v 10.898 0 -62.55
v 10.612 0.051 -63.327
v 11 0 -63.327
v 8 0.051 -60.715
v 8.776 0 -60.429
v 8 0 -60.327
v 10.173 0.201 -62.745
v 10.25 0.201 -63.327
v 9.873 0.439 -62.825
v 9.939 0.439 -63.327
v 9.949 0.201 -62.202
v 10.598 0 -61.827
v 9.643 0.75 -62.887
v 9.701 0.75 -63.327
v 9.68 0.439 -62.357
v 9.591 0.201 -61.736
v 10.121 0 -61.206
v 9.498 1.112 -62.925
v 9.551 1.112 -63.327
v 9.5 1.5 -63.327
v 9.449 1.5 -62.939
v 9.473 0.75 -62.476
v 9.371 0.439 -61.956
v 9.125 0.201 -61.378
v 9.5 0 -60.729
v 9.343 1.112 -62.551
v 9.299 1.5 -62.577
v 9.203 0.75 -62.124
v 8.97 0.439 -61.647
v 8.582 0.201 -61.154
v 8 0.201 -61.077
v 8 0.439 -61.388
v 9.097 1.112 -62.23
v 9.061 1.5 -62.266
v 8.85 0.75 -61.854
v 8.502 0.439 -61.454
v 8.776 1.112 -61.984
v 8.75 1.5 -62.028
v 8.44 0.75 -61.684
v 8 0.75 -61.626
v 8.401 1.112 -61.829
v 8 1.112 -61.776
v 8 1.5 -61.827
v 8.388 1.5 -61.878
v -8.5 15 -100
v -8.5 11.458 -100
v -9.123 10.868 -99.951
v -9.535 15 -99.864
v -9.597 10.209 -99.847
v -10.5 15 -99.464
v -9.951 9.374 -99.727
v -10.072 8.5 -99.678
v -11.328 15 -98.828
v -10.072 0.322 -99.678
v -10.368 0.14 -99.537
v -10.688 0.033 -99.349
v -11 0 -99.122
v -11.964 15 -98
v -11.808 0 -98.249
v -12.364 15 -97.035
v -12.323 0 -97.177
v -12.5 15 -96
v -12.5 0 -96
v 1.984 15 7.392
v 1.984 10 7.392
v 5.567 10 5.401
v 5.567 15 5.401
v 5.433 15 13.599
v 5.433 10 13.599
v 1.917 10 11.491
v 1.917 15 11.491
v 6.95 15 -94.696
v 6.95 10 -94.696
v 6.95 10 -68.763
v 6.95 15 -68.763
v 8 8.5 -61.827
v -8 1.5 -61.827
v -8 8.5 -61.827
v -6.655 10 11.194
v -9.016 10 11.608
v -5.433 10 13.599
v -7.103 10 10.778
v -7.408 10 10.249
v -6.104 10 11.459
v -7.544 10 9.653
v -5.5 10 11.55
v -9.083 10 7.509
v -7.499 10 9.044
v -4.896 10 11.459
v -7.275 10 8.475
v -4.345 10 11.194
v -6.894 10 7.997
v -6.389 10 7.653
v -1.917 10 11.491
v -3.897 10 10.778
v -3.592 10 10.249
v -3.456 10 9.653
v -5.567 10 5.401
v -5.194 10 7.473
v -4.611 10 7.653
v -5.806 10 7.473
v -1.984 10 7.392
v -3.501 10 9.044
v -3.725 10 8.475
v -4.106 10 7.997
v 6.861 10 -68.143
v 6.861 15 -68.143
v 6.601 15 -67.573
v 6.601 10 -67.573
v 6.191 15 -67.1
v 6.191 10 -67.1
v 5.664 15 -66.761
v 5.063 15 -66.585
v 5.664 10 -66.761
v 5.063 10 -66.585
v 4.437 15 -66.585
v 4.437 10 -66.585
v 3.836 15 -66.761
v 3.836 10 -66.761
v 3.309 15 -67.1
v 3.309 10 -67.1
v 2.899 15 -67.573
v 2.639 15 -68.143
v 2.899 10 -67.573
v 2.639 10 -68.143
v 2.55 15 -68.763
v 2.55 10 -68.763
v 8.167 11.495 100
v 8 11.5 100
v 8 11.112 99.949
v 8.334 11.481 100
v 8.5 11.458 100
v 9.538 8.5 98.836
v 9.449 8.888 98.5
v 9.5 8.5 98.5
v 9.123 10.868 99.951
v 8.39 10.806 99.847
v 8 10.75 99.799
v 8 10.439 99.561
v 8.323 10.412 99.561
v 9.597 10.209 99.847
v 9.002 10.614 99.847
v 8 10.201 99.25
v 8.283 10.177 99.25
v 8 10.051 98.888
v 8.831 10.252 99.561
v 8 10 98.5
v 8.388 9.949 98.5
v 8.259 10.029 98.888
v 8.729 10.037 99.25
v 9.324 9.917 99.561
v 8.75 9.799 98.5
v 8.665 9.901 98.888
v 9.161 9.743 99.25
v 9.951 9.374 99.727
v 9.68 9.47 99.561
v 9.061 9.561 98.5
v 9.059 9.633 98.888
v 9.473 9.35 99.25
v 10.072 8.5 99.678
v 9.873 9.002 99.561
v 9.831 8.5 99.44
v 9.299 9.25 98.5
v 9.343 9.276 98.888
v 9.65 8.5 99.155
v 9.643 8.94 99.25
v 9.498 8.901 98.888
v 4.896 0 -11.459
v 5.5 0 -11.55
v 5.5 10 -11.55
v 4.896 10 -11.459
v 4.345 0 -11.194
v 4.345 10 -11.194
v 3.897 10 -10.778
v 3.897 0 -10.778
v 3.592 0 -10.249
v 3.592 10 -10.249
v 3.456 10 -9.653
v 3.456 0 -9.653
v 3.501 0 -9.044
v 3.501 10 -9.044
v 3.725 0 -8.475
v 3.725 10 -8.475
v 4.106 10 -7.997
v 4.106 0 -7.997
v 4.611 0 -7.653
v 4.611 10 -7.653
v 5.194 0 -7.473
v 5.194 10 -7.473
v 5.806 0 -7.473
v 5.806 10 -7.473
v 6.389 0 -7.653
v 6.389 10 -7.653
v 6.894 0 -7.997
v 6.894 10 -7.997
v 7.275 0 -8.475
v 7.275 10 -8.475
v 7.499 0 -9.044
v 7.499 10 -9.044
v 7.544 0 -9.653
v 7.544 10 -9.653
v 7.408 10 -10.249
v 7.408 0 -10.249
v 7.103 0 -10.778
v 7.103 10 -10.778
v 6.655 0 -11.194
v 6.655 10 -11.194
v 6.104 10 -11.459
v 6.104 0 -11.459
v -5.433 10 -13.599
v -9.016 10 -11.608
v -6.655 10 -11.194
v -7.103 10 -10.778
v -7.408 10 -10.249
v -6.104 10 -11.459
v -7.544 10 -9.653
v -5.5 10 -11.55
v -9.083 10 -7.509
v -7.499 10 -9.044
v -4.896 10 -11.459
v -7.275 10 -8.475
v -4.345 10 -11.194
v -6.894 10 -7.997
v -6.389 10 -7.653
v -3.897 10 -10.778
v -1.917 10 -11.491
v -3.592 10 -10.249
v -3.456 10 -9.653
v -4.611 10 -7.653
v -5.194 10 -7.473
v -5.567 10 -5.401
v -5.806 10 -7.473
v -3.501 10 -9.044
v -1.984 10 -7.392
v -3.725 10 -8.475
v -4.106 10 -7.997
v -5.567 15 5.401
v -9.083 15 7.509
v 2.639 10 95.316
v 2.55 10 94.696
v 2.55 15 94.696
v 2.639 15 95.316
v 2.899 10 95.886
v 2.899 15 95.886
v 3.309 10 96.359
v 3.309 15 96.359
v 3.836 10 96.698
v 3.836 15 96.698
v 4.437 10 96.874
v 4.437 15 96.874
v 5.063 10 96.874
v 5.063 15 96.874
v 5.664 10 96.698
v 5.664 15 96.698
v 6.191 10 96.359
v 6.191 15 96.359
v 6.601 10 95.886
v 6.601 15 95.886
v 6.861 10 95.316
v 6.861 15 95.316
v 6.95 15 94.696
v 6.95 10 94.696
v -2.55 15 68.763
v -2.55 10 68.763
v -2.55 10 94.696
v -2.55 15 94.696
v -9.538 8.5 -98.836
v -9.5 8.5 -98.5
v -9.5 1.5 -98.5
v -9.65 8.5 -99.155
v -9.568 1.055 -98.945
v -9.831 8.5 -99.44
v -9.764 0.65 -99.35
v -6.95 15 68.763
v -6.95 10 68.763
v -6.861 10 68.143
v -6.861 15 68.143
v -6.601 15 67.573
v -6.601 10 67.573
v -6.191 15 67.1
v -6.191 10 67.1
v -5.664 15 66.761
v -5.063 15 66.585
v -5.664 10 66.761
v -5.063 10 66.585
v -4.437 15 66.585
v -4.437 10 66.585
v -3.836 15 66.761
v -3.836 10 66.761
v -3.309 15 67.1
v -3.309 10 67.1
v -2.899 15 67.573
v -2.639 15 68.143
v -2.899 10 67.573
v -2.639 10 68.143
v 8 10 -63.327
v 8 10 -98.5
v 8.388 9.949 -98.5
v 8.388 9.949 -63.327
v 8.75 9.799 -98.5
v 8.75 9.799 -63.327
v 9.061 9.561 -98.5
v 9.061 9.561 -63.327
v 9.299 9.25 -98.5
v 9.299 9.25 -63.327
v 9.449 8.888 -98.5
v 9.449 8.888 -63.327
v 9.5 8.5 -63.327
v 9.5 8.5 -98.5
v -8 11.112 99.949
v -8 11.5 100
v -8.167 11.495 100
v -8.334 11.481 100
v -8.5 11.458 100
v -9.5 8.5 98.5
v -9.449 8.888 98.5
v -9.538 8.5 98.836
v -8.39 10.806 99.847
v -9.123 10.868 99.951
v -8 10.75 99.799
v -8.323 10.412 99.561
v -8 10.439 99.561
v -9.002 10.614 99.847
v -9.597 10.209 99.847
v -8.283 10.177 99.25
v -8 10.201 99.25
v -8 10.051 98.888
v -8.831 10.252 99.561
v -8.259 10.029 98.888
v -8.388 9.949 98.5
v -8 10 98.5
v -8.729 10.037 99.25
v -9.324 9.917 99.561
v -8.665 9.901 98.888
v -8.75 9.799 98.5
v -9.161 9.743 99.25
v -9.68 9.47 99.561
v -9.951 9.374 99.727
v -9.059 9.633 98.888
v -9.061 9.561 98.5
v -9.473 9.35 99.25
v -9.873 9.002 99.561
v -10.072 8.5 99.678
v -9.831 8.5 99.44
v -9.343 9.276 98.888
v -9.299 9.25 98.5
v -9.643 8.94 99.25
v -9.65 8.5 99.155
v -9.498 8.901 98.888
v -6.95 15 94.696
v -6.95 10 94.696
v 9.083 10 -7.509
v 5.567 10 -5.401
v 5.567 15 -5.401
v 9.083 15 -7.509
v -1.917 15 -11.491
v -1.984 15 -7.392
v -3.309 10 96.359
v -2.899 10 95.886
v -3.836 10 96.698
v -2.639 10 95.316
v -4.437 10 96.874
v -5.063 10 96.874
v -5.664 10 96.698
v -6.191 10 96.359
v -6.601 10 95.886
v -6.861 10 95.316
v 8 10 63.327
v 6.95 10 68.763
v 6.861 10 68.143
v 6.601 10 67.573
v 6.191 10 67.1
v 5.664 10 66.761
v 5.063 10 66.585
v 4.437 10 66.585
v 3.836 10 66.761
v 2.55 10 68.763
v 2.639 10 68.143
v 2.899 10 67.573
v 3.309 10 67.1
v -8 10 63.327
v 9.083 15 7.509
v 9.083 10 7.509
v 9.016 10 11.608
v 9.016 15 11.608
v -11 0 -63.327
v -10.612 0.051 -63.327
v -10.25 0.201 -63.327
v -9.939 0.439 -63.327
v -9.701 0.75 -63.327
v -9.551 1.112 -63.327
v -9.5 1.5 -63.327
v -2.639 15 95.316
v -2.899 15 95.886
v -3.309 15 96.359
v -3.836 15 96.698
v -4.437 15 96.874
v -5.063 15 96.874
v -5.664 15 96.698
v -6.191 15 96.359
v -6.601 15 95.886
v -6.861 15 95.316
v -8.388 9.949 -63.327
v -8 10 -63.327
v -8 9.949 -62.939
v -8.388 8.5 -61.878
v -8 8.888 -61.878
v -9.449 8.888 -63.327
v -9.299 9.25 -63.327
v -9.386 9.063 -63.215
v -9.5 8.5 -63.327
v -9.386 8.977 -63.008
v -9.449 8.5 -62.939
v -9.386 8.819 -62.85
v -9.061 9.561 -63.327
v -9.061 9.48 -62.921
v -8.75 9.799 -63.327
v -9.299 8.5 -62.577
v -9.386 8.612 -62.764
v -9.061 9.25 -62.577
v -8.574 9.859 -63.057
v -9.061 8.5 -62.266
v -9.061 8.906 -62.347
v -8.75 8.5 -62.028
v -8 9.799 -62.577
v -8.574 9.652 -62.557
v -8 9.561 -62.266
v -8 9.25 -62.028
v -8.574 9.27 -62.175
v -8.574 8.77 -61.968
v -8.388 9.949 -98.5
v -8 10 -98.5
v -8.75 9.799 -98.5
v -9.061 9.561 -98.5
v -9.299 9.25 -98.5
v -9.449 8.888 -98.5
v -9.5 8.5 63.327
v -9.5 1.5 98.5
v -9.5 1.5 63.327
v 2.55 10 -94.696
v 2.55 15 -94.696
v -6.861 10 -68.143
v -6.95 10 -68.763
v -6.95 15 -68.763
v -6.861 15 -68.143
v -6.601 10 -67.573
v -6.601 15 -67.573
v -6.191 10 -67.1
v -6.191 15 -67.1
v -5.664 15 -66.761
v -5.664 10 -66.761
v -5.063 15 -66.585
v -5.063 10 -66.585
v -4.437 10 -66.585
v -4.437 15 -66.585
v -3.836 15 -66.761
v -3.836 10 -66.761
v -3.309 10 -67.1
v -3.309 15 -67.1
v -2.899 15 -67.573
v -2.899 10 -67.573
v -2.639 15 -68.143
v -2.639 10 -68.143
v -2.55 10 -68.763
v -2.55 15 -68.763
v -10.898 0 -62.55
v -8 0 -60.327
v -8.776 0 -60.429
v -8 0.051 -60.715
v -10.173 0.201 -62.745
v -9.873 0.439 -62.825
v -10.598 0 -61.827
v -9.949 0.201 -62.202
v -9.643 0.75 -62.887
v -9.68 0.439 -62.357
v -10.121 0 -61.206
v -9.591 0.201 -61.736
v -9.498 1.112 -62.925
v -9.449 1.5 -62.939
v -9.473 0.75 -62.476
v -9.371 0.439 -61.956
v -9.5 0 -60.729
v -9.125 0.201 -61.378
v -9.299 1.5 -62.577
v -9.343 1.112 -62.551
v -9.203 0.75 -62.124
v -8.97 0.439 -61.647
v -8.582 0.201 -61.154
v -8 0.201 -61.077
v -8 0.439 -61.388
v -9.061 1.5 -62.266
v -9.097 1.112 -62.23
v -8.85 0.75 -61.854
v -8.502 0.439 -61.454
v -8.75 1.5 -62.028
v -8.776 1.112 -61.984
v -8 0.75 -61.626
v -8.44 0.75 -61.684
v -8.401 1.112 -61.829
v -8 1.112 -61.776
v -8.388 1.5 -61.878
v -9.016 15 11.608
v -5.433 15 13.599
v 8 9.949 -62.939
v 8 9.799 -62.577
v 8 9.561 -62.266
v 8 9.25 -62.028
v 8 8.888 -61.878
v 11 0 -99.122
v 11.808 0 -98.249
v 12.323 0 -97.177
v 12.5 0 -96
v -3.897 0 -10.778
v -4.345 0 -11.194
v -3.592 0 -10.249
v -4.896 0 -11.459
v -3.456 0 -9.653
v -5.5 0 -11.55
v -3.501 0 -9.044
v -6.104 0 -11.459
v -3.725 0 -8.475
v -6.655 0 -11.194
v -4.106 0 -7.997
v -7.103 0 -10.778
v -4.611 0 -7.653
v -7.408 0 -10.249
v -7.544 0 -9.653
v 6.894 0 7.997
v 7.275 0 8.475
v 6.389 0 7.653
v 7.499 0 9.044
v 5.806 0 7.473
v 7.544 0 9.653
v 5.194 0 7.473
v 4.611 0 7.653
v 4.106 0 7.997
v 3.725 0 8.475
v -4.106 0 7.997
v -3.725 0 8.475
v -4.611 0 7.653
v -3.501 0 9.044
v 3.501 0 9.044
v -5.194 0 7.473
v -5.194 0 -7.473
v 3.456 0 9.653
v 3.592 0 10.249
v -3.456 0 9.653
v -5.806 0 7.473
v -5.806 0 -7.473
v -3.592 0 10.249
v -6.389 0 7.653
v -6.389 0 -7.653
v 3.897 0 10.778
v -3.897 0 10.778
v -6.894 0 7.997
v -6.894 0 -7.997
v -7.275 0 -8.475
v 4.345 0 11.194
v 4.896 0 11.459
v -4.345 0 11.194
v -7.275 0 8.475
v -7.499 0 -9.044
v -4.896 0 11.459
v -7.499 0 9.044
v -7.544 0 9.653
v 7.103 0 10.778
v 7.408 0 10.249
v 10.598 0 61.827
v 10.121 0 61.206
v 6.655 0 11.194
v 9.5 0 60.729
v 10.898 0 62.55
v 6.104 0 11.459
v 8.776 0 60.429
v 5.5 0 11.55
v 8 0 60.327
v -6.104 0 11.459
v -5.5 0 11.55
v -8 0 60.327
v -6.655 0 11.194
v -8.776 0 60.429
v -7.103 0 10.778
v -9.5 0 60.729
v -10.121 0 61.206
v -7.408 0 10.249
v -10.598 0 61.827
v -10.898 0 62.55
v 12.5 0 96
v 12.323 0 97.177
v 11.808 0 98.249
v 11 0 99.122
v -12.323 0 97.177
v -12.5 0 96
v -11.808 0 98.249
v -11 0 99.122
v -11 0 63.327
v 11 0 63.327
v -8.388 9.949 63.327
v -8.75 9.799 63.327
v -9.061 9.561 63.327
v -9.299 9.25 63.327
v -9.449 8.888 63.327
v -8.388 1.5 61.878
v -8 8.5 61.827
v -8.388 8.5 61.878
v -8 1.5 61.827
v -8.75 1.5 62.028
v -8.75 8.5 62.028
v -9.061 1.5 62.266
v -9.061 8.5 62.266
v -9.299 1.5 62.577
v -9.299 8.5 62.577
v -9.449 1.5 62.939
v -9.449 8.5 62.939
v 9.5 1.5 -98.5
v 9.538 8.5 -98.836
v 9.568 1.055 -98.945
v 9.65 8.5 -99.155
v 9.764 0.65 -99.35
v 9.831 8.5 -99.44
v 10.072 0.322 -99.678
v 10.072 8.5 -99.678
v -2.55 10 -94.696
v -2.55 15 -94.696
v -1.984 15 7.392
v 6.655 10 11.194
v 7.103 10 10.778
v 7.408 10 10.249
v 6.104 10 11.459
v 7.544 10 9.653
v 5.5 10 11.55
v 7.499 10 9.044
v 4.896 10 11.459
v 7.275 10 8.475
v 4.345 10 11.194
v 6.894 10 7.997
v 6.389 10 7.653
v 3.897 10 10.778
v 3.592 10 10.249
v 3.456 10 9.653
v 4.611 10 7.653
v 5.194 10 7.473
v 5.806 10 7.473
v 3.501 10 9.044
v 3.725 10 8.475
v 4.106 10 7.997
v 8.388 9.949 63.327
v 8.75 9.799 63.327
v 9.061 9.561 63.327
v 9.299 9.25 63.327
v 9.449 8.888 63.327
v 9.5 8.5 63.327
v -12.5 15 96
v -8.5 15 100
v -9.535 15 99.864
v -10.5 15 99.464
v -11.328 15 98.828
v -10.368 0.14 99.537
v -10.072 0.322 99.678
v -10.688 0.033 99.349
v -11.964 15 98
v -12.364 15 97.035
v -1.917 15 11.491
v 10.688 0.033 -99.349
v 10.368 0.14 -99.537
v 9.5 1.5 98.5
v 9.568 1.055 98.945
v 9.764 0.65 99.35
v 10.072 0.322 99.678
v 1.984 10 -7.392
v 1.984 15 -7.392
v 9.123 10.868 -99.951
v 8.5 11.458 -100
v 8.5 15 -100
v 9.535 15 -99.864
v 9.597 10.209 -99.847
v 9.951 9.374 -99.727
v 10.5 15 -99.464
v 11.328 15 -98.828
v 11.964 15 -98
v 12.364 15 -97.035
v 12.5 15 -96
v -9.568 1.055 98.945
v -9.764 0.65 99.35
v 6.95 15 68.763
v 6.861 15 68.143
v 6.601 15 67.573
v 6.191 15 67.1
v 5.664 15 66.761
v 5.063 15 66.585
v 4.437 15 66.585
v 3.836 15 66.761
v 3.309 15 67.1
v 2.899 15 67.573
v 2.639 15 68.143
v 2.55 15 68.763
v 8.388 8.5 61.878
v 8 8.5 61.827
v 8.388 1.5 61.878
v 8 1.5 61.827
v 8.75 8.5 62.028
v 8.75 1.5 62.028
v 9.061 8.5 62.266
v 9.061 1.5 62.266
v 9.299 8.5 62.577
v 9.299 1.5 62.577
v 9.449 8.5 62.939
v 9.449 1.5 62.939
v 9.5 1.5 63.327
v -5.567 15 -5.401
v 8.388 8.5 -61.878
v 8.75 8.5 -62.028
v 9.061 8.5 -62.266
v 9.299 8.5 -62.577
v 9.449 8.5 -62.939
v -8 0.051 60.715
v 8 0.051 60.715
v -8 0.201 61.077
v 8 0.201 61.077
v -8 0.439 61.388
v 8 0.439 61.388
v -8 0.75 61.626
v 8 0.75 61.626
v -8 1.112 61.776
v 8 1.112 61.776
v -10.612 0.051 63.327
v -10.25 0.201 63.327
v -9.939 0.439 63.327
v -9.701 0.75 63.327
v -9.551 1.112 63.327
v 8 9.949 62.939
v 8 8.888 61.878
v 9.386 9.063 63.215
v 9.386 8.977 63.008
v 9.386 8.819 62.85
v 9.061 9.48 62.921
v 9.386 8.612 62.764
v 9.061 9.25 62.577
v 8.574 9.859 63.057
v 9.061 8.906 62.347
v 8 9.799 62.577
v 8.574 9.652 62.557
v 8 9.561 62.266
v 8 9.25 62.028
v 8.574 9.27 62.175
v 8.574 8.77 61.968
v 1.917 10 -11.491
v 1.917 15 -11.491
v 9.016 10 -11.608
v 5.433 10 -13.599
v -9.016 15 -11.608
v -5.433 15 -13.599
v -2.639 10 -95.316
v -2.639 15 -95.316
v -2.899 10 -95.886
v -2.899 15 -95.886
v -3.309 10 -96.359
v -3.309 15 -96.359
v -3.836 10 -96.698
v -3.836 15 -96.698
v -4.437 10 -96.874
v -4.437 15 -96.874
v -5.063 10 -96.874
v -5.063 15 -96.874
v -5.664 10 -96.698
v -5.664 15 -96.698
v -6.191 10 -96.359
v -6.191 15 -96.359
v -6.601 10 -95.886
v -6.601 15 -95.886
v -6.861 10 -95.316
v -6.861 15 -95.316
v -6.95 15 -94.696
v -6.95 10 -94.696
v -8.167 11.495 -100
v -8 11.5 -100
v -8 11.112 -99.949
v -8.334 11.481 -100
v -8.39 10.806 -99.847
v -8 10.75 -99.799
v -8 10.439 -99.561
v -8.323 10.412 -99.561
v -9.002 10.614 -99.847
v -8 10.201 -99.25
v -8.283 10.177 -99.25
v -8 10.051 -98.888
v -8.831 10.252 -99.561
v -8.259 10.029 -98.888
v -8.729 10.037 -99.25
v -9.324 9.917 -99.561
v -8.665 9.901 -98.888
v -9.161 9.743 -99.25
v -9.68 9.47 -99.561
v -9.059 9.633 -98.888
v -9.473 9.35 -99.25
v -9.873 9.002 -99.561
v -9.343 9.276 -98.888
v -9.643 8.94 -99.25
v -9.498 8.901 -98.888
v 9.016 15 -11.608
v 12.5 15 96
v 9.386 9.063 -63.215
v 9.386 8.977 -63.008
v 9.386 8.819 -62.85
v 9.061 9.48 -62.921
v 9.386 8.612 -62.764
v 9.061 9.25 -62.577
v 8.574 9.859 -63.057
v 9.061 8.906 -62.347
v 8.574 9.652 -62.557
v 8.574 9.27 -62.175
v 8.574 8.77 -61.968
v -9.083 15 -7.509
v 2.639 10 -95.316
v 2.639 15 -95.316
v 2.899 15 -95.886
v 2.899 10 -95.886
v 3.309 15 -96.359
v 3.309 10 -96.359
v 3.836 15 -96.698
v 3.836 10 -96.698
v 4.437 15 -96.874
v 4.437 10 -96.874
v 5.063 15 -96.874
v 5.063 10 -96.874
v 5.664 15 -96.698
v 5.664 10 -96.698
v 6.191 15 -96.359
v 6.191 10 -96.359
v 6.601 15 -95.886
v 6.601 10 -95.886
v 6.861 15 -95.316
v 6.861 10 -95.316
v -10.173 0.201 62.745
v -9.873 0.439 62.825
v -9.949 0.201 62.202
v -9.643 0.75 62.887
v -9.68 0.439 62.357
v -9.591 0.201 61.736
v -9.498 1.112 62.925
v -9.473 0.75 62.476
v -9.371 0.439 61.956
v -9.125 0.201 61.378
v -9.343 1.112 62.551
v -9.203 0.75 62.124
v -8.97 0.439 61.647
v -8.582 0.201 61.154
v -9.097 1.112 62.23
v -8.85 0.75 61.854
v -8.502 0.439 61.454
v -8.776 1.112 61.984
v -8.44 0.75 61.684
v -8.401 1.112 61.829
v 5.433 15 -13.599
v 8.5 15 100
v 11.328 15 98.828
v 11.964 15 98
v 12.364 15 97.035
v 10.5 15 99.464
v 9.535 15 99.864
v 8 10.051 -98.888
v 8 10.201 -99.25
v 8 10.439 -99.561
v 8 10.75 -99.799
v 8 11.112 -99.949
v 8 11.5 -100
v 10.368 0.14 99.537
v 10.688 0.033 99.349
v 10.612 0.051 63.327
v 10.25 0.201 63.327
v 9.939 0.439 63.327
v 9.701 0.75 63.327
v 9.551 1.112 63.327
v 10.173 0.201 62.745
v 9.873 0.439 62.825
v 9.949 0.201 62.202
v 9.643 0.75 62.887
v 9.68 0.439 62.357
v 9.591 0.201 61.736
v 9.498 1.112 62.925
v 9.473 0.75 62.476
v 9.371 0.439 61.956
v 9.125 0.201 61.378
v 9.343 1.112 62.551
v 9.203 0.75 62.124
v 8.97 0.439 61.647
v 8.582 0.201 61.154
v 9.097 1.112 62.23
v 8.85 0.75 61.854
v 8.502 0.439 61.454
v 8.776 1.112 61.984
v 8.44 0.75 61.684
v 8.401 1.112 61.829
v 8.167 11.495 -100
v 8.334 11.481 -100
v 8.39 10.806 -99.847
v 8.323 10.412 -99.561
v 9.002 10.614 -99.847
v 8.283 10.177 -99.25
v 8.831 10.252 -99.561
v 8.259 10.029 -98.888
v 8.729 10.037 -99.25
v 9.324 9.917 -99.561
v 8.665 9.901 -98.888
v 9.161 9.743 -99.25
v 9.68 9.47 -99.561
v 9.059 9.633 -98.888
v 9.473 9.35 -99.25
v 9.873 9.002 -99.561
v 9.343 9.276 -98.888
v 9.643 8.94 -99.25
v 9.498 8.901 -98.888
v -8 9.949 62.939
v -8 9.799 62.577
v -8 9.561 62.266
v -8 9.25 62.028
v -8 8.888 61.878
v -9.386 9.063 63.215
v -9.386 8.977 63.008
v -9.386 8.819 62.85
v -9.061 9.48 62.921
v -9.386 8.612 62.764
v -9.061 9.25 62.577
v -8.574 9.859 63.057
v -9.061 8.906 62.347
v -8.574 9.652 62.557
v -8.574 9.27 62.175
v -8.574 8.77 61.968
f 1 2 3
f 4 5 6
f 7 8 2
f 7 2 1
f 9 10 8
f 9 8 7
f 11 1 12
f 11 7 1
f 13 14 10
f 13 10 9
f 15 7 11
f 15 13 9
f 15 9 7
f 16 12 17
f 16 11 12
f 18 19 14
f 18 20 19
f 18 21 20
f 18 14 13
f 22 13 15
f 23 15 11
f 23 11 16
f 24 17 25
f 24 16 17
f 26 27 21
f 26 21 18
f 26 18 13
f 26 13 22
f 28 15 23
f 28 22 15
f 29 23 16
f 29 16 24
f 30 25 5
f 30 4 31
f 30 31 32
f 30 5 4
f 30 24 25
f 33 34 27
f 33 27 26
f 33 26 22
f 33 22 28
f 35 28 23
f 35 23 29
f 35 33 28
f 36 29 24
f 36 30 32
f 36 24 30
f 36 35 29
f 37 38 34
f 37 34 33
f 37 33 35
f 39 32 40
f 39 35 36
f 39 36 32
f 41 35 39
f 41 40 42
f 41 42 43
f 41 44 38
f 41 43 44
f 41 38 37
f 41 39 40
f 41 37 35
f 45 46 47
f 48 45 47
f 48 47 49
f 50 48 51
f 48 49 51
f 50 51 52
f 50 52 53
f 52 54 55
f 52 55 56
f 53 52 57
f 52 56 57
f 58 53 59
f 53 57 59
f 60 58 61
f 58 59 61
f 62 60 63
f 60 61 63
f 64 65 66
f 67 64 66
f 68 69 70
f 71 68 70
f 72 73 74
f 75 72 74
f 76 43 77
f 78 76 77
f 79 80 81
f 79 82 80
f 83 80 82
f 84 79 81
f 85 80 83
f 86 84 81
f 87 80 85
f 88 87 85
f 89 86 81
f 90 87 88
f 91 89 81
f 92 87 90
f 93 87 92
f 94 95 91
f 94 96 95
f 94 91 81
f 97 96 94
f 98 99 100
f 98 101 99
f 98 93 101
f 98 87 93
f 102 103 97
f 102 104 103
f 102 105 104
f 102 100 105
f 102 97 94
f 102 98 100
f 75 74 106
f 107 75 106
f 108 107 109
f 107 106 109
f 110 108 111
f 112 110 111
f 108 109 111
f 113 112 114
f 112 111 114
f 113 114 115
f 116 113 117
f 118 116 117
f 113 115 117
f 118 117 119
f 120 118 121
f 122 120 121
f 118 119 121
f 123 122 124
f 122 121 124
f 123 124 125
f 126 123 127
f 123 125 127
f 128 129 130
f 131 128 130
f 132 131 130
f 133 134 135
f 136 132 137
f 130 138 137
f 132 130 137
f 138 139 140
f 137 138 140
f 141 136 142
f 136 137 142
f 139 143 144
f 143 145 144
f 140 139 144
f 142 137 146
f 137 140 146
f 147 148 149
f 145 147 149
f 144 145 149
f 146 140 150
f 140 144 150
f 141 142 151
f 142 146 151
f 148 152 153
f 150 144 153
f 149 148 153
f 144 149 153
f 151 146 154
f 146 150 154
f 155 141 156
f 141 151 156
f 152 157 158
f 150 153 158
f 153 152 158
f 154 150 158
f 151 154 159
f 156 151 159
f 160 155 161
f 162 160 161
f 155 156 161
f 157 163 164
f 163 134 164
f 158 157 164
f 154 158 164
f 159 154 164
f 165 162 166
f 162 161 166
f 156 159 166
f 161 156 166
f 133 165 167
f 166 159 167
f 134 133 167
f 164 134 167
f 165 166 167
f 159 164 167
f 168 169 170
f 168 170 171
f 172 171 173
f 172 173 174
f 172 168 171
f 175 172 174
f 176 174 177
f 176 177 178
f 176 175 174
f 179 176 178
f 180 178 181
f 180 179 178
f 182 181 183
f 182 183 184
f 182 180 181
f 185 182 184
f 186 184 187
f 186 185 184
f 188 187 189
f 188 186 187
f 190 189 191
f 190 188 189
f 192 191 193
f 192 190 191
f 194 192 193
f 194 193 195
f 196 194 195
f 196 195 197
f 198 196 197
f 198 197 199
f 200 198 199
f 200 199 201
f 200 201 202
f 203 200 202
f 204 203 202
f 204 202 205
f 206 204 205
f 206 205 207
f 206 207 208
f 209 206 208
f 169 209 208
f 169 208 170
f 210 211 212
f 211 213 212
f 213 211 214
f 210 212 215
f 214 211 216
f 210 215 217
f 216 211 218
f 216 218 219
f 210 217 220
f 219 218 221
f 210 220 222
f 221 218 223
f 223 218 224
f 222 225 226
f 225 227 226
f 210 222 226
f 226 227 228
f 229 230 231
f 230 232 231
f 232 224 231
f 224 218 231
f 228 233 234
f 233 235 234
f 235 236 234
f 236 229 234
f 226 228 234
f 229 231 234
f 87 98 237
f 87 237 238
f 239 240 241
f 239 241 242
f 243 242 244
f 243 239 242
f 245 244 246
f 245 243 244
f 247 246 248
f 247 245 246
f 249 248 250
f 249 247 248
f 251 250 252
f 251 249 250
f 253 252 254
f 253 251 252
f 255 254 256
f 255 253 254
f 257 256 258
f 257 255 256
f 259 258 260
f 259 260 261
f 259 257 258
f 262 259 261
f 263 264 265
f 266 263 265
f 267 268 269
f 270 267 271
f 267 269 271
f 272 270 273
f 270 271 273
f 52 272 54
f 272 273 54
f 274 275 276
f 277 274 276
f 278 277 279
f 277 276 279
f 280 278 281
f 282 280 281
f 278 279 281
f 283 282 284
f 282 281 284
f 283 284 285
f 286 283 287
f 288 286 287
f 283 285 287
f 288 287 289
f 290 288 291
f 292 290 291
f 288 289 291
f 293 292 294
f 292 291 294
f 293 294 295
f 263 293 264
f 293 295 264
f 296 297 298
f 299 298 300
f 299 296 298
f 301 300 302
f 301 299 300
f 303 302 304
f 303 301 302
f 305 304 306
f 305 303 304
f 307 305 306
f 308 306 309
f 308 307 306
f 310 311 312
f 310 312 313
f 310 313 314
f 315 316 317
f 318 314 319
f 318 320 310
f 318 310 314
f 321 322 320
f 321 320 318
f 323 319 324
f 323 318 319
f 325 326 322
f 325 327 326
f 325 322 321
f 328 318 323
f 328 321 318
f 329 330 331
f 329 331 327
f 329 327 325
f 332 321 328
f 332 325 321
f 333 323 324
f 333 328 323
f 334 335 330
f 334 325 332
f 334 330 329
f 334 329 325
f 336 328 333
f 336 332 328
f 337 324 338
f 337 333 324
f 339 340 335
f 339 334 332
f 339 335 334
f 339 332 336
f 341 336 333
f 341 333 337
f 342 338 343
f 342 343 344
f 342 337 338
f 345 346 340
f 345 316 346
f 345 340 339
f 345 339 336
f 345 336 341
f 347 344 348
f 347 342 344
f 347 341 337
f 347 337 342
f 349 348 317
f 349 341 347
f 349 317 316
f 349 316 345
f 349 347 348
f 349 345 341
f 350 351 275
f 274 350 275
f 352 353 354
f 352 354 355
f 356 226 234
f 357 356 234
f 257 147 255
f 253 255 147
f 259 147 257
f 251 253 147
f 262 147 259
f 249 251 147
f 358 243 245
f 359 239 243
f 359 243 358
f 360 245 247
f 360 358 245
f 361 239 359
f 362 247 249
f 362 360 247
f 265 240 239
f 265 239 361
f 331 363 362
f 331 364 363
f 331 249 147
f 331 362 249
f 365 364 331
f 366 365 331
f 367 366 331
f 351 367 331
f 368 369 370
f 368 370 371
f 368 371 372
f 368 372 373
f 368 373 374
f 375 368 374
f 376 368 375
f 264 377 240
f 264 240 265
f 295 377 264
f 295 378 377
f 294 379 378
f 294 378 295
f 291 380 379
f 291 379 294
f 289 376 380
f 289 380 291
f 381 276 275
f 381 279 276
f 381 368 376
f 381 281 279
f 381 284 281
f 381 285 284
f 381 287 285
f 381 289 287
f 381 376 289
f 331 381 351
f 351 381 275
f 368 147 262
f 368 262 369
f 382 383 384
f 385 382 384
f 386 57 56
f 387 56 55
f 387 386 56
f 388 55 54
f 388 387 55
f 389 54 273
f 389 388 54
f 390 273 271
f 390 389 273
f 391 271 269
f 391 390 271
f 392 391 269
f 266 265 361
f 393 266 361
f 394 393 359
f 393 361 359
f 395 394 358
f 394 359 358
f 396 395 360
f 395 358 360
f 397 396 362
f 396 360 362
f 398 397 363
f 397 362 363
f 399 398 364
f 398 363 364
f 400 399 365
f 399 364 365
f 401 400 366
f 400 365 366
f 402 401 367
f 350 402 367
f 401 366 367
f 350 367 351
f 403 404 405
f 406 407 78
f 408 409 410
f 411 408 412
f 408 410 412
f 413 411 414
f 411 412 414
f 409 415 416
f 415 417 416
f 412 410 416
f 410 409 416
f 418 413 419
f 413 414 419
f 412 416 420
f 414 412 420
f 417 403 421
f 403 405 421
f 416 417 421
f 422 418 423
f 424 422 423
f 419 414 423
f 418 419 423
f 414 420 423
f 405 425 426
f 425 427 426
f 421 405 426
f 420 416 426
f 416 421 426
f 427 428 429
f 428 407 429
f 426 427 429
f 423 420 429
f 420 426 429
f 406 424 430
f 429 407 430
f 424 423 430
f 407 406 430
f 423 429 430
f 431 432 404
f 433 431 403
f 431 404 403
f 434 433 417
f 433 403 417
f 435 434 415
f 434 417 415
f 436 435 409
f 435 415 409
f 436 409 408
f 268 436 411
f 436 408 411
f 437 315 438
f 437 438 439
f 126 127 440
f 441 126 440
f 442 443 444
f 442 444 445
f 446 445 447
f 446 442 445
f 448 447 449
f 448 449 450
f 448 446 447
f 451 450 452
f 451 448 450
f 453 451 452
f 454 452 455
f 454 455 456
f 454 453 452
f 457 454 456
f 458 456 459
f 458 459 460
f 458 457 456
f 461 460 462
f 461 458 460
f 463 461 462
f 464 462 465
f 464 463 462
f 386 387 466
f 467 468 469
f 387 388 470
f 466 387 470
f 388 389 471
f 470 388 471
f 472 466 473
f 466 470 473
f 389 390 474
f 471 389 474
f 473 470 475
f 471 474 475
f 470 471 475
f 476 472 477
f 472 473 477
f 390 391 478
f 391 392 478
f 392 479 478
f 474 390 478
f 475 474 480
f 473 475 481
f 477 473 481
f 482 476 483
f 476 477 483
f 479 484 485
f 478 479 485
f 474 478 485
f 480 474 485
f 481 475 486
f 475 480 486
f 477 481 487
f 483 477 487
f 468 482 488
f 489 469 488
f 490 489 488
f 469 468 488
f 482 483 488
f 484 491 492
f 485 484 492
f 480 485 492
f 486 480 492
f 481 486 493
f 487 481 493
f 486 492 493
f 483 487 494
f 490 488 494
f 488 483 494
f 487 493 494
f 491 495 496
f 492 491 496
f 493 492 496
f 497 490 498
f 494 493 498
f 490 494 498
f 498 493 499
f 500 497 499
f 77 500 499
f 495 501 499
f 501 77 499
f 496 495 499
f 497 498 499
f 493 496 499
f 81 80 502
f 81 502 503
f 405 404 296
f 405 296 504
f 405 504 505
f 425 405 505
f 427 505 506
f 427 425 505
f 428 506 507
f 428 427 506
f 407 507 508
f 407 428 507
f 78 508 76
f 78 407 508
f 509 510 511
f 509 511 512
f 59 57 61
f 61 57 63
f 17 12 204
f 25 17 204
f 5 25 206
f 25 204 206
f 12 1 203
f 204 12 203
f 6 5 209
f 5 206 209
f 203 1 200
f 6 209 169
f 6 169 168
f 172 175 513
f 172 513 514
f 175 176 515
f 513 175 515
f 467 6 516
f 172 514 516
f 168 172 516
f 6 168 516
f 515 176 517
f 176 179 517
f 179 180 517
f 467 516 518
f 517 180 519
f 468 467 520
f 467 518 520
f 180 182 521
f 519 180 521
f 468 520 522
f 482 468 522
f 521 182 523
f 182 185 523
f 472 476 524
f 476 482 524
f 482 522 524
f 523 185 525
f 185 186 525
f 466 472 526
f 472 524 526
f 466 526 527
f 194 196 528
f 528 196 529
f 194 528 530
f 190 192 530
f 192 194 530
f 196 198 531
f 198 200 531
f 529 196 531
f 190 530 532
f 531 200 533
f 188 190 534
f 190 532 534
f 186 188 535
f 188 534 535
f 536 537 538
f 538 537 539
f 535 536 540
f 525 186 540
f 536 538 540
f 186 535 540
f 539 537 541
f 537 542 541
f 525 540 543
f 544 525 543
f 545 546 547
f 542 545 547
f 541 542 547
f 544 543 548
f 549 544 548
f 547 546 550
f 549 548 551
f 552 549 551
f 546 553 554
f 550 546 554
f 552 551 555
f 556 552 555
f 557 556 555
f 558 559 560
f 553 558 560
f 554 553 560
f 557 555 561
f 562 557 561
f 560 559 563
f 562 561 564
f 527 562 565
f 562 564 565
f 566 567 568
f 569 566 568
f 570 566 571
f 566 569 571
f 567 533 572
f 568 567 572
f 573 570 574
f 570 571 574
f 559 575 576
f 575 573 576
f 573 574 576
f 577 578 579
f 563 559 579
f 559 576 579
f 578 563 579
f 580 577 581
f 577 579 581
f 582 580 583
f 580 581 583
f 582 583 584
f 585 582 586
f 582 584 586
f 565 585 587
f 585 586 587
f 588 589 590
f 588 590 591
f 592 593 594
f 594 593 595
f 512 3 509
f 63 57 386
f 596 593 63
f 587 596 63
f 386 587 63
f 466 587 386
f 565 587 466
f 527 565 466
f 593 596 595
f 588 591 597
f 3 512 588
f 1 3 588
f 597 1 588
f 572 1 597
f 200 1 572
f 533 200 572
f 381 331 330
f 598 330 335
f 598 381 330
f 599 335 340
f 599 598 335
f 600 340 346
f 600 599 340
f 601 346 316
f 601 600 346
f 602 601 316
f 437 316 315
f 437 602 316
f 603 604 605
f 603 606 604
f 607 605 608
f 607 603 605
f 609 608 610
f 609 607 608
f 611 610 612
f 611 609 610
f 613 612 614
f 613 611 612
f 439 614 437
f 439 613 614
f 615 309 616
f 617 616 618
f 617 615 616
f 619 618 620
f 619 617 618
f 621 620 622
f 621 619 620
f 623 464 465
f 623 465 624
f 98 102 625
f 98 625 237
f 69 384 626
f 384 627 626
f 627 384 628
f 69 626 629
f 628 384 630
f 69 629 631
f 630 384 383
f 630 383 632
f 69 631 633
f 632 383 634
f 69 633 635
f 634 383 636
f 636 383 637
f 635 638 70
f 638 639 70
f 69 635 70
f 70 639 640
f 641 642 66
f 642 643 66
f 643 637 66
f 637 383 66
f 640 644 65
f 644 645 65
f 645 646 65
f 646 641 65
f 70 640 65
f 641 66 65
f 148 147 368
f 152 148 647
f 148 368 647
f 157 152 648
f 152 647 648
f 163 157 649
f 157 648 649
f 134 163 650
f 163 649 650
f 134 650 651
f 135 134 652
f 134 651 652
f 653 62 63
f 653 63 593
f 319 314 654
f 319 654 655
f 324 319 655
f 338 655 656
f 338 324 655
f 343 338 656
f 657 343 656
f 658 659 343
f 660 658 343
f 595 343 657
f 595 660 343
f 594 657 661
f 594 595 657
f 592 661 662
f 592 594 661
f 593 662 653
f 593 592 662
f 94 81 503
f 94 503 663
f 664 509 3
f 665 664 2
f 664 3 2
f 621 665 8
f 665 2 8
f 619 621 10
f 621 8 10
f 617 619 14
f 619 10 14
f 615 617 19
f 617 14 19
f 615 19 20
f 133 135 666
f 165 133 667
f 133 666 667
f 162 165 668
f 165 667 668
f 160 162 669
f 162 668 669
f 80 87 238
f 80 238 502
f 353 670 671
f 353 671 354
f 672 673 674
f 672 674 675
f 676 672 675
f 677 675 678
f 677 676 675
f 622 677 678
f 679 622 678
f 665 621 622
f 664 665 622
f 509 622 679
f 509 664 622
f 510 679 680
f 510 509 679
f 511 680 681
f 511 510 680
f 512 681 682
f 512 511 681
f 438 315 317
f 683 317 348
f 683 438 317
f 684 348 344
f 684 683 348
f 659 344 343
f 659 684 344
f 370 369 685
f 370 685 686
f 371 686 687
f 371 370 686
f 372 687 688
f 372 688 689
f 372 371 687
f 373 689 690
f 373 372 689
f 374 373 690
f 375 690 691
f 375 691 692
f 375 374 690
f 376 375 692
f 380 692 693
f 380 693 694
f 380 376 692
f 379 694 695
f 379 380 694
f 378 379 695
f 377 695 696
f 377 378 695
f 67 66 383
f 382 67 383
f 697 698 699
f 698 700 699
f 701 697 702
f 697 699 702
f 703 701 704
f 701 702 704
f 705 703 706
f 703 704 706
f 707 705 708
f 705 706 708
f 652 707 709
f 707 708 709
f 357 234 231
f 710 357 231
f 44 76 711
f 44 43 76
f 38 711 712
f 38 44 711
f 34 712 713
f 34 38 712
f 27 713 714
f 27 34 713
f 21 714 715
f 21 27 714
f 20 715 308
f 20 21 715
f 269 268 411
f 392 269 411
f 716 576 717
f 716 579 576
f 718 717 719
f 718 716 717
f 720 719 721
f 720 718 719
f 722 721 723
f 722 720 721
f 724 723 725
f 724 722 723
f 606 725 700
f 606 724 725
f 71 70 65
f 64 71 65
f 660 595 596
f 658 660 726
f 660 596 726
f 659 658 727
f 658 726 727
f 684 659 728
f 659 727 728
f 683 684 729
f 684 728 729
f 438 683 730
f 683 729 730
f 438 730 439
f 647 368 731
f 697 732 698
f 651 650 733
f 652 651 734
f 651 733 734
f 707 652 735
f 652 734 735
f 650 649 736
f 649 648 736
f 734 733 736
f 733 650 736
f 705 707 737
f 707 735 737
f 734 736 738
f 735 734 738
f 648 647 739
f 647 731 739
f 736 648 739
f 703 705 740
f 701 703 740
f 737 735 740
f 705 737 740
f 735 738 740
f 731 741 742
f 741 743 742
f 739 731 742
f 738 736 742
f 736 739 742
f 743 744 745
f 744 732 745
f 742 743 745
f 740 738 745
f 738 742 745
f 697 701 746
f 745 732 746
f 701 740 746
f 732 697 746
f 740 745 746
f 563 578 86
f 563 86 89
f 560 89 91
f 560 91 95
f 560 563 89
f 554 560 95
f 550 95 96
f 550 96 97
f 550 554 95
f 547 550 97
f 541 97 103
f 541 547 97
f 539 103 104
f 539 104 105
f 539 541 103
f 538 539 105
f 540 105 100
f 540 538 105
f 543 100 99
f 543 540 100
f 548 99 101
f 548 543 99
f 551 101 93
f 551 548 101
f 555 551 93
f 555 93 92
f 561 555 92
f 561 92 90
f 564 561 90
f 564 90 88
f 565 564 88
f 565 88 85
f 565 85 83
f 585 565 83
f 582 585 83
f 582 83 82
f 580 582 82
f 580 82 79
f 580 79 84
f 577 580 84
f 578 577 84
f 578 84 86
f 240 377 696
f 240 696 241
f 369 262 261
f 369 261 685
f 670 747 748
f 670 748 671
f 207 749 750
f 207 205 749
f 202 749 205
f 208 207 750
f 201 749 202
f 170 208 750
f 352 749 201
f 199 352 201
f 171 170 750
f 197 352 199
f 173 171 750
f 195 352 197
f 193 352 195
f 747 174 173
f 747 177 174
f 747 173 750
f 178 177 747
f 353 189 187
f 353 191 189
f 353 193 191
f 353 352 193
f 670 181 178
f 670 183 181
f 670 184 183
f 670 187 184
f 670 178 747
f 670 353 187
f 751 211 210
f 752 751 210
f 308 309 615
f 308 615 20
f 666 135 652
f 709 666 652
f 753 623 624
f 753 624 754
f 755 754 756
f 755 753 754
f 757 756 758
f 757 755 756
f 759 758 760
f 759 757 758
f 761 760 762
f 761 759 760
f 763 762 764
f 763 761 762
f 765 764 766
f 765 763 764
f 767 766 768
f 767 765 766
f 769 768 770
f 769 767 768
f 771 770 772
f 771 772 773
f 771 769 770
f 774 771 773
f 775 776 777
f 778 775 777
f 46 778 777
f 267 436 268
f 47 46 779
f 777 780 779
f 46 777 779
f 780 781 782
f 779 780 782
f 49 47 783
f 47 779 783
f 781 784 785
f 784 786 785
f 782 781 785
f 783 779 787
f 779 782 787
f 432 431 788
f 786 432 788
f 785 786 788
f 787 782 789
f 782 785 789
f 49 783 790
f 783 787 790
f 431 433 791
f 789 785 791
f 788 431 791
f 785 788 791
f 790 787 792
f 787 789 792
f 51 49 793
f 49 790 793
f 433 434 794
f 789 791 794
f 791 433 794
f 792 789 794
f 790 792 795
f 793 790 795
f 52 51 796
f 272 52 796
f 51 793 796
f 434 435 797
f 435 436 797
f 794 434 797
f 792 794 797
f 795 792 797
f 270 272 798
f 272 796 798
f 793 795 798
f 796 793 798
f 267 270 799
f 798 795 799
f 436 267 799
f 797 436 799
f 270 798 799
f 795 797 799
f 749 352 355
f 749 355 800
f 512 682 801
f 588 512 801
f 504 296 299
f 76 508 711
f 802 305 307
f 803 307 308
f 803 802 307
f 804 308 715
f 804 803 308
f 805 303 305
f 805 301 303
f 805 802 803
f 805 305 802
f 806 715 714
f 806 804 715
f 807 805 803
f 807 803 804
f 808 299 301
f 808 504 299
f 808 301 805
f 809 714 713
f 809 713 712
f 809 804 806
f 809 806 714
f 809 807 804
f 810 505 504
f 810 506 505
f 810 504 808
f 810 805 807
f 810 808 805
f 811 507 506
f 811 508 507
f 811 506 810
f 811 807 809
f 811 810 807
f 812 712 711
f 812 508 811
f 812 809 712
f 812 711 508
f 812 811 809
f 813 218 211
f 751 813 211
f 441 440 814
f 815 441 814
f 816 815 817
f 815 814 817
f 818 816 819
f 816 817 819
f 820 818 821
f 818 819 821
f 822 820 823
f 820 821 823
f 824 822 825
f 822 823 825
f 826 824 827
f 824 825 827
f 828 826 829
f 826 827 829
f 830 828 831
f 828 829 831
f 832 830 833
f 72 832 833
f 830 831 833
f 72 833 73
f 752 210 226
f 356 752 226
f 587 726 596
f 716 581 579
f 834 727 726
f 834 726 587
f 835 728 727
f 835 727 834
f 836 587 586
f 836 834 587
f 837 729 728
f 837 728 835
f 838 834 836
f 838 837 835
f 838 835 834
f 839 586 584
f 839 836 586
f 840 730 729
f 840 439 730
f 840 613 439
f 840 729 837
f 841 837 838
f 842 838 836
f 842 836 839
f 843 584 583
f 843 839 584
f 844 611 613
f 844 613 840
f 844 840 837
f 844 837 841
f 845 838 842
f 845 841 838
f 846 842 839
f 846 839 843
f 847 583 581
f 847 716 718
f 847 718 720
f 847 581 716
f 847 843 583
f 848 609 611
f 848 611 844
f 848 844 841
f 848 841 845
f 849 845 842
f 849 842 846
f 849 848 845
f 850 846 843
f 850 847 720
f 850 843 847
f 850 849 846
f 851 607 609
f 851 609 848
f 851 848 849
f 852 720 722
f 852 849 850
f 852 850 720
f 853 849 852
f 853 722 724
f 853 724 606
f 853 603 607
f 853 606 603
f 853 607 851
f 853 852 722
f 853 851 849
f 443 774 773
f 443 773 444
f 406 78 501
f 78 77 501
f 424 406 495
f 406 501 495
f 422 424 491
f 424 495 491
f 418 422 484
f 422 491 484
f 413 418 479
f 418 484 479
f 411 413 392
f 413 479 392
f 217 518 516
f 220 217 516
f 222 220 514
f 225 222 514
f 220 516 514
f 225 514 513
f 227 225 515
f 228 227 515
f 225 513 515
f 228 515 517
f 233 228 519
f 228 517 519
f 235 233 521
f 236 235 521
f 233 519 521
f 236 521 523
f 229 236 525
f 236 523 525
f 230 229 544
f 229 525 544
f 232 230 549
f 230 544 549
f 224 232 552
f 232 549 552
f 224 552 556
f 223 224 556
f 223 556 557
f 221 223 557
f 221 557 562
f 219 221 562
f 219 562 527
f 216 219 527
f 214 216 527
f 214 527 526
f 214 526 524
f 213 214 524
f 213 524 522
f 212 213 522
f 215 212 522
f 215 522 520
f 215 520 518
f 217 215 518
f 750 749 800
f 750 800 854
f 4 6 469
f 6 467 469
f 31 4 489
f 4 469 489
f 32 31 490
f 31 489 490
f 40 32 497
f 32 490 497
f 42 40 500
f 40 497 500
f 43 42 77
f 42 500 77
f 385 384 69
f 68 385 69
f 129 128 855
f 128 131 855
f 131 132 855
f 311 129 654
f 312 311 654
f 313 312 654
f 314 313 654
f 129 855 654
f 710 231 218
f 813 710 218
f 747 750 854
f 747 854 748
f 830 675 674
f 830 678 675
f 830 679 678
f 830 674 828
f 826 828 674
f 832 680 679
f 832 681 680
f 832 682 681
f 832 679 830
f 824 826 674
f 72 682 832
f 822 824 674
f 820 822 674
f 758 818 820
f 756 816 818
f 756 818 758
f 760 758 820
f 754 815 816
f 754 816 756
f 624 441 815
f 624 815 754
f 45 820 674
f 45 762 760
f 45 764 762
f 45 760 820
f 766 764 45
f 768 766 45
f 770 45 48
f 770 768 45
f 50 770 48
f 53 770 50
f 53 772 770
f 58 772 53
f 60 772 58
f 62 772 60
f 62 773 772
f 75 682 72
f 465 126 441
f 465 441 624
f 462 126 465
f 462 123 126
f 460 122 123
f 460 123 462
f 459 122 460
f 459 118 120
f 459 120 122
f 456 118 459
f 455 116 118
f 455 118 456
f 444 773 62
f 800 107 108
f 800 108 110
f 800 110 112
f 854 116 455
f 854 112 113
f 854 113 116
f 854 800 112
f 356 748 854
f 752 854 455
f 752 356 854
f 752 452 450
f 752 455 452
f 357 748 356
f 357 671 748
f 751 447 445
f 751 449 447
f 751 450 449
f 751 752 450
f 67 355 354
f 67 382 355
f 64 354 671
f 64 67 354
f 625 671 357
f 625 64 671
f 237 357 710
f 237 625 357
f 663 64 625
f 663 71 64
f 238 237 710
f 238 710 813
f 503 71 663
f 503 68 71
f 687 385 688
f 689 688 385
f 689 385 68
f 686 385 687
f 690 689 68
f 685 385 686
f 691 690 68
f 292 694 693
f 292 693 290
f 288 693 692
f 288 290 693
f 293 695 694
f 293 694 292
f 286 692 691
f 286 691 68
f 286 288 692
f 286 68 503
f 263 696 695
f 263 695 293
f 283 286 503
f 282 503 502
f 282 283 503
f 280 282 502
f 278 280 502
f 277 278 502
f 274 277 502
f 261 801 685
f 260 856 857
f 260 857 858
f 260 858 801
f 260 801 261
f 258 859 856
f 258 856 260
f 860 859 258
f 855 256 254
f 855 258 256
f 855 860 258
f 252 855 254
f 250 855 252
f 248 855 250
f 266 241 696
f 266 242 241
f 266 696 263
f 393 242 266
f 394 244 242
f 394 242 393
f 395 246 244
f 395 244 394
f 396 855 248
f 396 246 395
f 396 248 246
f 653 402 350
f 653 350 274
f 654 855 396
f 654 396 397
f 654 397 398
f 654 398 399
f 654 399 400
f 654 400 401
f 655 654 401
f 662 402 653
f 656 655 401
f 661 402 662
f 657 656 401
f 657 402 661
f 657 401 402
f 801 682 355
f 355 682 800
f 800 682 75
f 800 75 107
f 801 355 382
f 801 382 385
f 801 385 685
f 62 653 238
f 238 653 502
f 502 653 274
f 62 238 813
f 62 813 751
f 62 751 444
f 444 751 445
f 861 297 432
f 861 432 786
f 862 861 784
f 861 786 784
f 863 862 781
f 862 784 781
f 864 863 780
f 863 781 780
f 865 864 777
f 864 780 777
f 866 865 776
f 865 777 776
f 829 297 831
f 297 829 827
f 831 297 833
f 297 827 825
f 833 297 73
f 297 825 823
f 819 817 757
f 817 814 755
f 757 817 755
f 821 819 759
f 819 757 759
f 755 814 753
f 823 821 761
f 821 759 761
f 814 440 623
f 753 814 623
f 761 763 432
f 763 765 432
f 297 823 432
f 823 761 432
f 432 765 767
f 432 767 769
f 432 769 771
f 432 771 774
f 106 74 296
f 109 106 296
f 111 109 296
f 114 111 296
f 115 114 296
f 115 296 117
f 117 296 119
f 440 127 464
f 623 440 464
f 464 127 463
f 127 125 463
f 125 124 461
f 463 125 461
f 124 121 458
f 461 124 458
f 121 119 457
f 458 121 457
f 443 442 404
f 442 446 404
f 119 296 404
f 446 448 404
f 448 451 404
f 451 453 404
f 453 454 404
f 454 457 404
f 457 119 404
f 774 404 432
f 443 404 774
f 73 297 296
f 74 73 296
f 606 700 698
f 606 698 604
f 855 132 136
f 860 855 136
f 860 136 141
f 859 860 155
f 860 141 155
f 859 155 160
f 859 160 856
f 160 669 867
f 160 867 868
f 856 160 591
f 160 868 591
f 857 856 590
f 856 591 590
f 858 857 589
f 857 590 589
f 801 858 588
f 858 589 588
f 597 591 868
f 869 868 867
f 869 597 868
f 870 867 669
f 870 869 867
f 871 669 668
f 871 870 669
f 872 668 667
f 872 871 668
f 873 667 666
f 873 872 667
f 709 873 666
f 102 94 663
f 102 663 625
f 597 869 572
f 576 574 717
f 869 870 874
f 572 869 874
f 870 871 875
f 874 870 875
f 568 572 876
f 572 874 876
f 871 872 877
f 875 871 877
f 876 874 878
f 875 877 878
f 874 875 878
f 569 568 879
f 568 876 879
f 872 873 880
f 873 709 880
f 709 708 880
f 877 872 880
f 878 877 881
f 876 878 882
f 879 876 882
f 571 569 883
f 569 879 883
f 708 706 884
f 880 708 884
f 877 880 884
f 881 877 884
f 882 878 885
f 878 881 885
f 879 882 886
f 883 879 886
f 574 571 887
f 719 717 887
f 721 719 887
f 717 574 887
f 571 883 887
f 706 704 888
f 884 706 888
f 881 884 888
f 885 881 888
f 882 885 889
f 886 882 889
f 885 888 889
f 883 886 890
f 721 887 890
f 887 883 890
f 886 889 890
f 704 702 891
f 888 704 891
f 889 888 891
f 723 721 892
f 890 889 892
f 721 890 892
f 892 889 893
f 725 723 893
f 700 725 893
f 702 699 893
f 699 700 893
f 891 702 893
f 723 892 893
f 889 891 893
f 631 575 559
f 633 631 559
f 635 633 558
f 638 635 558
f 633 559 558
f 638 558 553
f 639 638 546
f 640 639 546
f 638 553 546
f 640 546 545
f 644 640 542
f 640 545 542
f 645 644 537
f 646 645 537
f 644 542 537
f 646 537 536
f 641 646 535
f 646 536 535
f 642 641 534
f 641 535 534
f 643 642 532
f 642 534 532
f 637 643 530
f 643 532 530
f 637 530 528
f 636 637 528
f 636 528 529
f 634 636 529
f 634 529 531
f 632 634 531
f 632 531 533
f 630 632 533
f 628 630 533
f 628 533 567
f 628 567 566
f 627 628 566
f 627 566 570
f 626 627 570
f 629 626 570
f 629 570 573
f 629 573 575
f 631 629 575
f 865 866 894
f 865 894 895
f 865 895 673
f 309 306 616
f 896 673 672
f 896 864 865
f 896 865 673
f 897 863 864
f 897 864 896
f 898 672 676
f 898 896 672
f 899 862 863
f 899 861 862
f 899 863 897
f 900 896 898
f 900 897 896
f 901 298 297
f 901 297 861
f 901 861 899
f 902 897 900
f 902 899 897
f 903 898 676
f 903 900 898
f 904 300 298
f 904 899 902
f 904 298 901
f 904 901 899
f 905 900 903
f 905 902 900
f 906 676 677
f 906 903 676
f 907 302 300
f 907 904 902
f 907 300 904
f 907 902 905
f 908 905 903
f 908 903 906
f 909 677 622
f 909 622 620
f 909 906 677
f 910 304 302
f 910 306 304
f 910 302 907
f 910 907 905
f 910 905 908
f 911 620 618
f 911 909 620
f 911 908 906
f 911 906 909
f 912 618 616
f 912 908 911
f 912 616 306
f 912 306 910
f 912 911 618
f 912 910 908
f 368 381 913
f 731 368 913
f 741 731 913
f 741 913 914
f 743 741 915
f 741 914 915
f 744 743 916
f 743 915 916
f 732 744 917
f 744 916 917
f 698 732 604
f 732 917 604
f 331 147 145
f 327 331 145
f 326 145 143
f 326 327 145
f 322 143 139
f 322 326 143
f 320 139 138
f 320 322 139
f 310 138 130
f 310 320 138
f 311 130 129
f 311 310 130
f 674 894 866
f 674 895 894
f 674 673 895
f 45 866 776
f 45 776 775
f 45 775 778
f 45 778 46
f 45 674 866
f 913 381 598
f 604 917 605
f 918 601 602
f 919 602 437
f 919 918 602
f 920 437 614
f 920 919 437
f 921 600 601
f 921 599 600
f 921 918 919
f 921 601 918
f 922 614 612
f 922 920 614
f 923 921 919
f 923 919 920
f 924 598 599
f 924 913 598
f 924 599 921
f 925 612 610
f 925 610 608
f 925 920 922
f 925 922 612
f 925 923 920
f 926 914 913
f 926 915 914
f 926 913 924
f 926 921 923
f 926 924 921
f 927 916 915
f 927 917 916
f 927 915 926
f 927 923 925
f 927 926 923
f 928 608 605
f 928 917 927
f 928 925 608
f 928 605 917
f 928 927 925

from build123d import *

# Parameters (mm, degrees)
SKETCH1_W           = 9.5
SKETCH1_H           = 100
SKETCH1_R           = 2.05
BOSS_EXTRUDE1_DEPTH = 15
CUT_EXTRUDE1_START  = -5
SKETCH2_R           = 2.05
CUT_EXTRUDE1_DEPTH  = 5
SKETCH3_W           = 11.226687125
SKETCH3_H           = 38.173064709
CUT_EXTRUDE2_DEPTH  = 10
SKETCH6_W           = 3
SKETCH6_H           = 100
BOSS_EXTRUDE2_DEPTH = 15
FILLET1_R           = 1.5
FILLET2_START       = -1
FILLET2_DEPTH       = 17


with BuildPart() as part:
    # Sketch1 → Boss-Extrude1 (new body)
    with BuildSketch(Plane(origin=(0, 0, 0), x_dir=(1, 0, 0), z_dir=(0, 1, 0))):
        with Locations((-4.75, -50)):
            Rectangle(SKETCH1_W, SKETCH1_H)
        with BuildLine():
            ThreePointArc((-2.55, -94.696458633), (-4.75, -96.896458633), (-6.95, -94.696458633))
            Line((-6.95, -94.696458633), (-6.95, -68.762531393))
            ThreePointArc((-6.95, -68.762531393), (-4.75, -66.562531393), (-2.55, -68.762531393))
            Line((-2.55, -68.762531393), (-2.55, -94.696458633))
        make_face(mode=Mode.SUBTRACT)
        with Locations(Location((-5.5, -9.5, 0), (0, 0, 270))):
            Circle(SKETCH1_R, mode=Mode.SUBTRACT)
    extrude(amount=BOSS_EXTRUDE1_DEPTH)

    # Sketch2 → Cut-Extrude1 (cut)
    with BuildSketch(Plane(origin=(0, 15, 0), x_dir=(1, 0, 0), z_dir=(0, 1, 0)).offset(CUT_EXTRUDE1_START)):
        Polygon((-9.015868986, -11.607604946), (-5.432695069, -13.598634331), (-1.916826083, -11.491029385), (-1.984131014, -7.392395054), (-5.567304931, -5.401365669), (-9.083173917, -7.508970615), align=None)
        with Locations(Location((-5.5, -9.5, 0), (0, 0, 270))):
            Circle(SKETCH2_R, mode=Mode.SUBTRACT)
    extrude(amount=CUT_EXTRUDE1_DEPTH, mode=Mode.SUBTRACT)

    # Sketch3 → Cut-Extrude2 (cut)
    with BuildSketch(Plane(origin=(0, 0, 0), x_dir=(1, 0, 0), z_dir=(0, 1, 0))):
        with Locations((-5.613343563, -80.913467646)):
            Rectangle(SKETCH3_W, SKETCH3_H)
    extrude(amount=CUT_EXTRUDE2_DEPTH, mode=Mode.SUBTRACT)

    # Sketch6 → Boss-Extrude2 (add)
    with BuildSketch(Plane(origin=(0, 15, 0), x_dir=(1, 0, 0), z_dir=(0, 1, 0))):
        with Locations((-11, -50)):
            Rectangle(SKETCH6_W, SKETCH6_H)
    extrude(amount=-BOSS_EXTRUDE2_DEPTH)

    # Fillet1
    fillet1_edges = [part.edges().sort_by_distance(p)[0] for p in [
        (-4.75, 10, 61.826935291),
        (-9.5, 10, 80.913467645),
        (-4.75, 10, 100),
        (-4.75, 0, 61.826935291),
        (-9.5, 5, 61.826935291),
        (-9.5, 5, 100),
        (-9.5, 0, 80.913467645),
    ]]
    fillet(fillet1_edges, radius=FILLET1_R)

    # Fillet2: read off the stored shape, not the designer's step
    # Fillet2 outline → Fillet2 (cut)
    with BuildSketch(Plane(origin=(0, 0, 0), x_dir=(1, 0, 0), z_dir=(0, 1, 0)).offset(FILLET2_START)):
        with BuildLine():
            ThreePointArc((-8.5, -100), (-11.328427125, -98.828427125), (-12.5, -96))
            Line((-12.5, -96), (-12.5, -100))
            Line((-12.5, -100), (-8.5, -100))
        make_face()
    extrude(amount=FILLET2_DEPTH, mode=Mode.SUBTRACT)

    # Mirror1: part across plane


with BuildPart() as part_1:
    add(part.part)
    add(part.part.mirror(Plane(origin=(0, 15, 0), x_dir=(0, 0, 1), z_dir=(1, 0, 0))))

    # Mirror2: part across face


with BuildPart() as part_2:
    add(part_1.part)
    add(part_1.part.mirror(Plane(origin=(0, 7.5, 0), x_dir=(1, 0, 0), z_dir=(0, 0, -1))))


solid = part_2.part
